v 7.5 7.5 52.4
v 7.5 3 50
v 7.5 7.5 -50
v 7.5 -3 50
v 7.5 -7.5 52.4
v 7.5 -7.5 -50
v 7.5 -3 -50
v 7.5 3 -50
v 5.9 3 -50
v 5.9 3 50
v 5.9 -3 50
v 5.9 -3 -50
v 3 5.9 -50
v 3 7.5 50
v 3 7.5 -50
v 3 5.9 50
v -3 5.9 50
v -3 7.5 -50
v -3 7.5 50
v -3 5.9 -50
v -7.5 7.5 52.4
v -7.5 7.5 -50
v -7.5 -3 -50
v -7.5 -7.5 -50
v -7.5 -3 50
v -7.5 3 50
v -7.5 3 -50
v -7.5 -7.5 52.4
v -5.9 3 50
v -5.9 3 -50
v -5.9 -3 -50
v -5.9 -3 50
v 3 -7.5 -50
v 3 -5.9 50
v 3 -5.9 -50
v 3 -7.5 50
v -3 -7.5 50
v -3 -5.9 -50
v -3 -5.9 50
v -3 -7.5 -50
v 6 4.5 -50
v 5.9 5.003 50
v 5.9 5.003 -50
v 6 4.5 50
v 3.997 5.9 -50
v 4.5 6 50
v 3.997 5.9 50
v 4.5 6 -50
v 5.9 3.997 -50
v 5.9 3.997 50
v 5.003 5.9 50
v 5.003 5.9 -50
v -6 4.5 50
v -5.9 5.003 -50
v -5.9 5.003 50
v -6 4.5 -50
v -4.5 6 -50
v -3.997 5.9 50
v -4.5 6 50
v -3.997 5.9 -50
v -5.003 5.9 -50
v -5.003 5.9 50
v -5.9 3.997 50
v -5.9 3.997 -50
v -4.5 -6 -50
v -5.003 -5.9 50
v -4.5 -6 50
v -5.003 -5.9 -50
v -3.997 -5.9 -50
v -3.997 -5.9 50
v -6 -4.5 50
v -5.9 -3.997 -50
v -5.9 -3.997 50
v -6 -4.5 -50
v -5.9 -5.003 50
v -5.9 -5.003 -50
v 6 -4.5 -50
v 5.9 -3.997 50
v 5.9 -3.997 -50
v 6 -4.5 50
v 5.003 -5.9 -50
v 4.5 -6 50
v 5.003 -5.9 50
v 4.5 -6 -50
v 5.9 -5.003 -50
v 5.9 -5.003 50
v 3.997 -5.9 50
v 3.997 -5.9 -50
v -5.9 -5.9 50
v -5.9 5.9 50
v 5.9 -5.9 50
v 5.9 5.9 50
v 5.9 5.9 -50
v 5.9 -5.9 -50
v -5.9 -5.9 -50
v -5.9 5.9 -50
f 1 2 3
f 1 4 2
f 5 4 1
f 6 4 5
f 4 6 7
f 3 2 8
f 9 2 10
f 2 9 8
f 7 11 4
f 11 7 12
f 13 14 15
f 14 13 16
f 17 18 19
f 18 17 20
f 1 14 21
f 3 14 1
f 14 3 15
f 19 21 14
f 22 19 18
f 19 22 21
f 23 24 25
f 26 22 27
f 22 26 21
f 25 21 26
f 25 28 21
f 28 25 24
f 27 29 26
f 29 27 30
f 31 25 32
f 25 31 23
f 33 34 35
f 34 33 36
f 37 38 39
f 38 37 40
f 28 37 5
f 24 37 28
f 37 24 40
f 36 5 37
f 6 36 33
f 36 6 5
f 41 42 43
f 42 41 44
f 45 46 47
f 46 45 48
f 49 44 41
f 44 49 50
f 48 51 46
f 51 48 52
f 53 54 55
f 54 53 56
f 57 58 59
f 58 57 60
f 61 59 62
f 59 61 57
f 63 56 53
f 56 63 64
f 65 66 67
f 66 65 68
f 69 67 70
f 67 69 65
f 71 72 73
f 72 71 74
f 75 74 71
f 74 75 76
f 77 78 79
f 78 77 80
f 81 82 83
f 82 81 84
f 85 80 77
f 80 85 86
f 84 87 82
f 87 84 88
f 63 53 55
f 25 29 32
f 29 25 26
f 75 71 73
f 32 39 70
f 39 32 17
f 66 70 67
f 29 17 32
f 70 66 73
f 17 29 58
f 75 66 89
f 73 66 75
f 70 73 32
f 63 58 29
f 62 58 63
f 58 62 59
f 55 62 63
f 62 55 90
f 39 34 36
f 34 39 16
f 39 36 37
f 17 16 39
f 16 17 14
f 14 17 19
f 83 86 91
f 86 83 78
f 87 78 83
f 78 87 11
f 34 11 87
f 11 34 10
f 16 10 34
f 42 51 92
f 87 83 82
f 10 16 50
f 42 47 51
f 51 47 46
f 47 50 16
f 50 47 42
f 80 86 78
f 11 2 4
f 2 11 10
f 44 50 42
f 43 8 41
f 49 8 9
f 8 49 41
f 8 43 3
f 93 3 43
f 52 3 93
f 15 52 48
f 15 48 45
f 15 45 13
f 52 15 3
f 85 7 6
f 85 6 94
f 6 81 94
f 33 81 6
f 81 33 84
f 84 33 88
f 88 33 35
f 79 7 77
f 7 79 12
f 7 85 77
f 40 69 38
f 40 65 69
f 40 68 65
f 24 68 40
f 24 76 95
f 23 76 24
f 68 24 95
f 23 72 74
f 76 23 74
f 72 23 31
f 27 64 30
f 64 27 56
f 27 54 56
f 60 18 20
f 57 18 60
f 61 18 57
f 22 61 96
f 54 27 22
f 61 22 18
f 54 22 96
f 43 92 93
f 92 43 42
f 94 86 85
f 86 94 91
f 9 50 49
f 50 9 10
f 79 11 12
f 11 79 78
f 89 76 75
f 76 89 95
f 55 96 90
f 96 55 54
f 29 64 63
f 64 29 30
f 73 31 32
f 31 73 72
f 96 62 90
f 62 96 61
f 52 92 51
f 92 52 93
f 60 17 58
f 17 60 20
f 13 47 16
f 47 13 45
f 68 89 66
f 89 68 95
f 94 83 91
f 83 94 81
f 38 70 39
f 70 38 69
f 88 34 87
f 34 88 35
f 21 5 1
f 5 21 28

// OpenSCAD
// Parameters
cross_section_width_mm = 15.0; //[7.5:30.0:0.5]
cross_section_height_mm = 15.0; //[7.5:30.0:0.5]
length_mm = 100.0; //[50.0:200.0:1]
center_model = 1; //[0:1:1]
include_corner_holes = 1; //[0:1:1]
wall_thickness_mm = 1.6; //[0.8:3.2:0.1]
slot_opening_mm = 3.2; //[1.6:6.4:0.1]
slot_depth_mm = 3.0; //[1.5:6.0:0.1]
slot_inner_width_mm = 6.0; //[3.0:10.0:0.1]
slot_inner_depth_mm = 2.5; //[1.0:5.0:0.1]
center_bore_diameter_mm = 5.0; //[2.5:10.0:0.1]
corner_hole_diameter_mm = 3.0; //[1.5:6.0:0.1]
corner_hole_inset_mm = 3.0; //[1.5:6.0:0.1]
cut_clearance_mm = 0.5; //[0.2:1.5:0.1]

// Extrusion - complete detailed geometry
module extrusion() {
  color("Silver") {
    difference() {
      // Main body
      cube([cross_section_width_mm, cross_section_height_mm, length_mm], center=true);
      
      // Inner void
      translate([0, 0, 0])
        cube([cross_section_width_mm - 2*wall_thickness_mm, cross_section_height_mm - 2*wall_thickness_mm, length_mm + 2*cut_clearance_mm], center=true);
      
      // Center bore
      translate([0, 0, 0])
        cylinder(r=center_bore_diameter_mm/2, h=length_mm + 2*cut_clearance_mm, center=true, $fn=32);
      
      // T-slot channels
      union() {
        translate([cross_section_width_mm/2 - (slot_depth_mm + slot_inner_depth_mm)/2, 0, 0])
          cube([slot_depth_mm + slot_inner_depth_mm, slot_inner_width_mm, length_mm + 2*cut_clearance_mm], center=true);
        translate([cross_section_width_mm/2 - slot_depth_mm/2, 0, 0])
          cube([slot_depth_mm, slot_opening_mm, length_mm + 2*cut_clearance_mm], center=true);
        translate([0, cross_section_height_mm/2 - (slot_depth_mm + slot_inner_depth_mm)/2, 0])
          cube([slot_inner_width_mm, slot_depth_mm + slot_inner_depth_mm, length_mm + 2*cut_clearance_mm], center=true);
        translate([0, cross_section_height_mm/2 - slot_depth_mm/2, 0])
          cube([slot_opening_mm, slot_depth_mm, length_mm + 2*cut_clearance_mm], center=true);
        translate([-cross_section_width_mm/2 + (slot_depth_mm + slot_inner_depth_mm)/2, 0, 0])
          cube([slot_depth_mm + slot_inner_depth_mm, slot_inner_width_mm, length_mm + 2*cut_clearance_mm], center=true);
        translate([-cross_section_width_mm/2 + slot_depth_mm/2, 0, 0])
          cube([slot_depth_mm, slot_opening_mm, length_mm + 2*cut_clearance_mm], center=true);
        translate([0, -cross_section_height_mm/2 + (slot_depth_mm + slot_inner_depth_mm)/2, 0])
          cube([slot_inner_width_mm, slot_depth_mm + slot_inner_depth_mm, length_mm + 2*cut_clearance_mm], center=true);
        translate([0, -cross_section_height_mm/2 + slot_depth_mm/2, 0])
          cube([slot_opening_mm, slot_depth_mm, length_mm + 2*cut_clearance_mm], center=true);
      }
      
      // Corner holes
      if (include_corner_holes) {
        union() {
          translate([cross_section_width_mm/2 - corner_hole_inset_mm, cross_section_height_mm/2 - corner_hole_inset_mm, 0])
            cylinder(r=corner_hole_diameter_mm/2, h=length_mm + 2*cut_clearance_mm, center=true, $fn=16);
          translate([-cross_section_width_mm/2 + corner_hole_inset_mm, cross_section_height_mm/2 - corner_hole_inset_mm, 0])
            cylinder(r=corner_hole_diameter_mm/2, h=length_mm + 2*cut_clearance_mm, center=true, $fn=16);
          translate([-cross_section_width_mm/2 + corner_hole_inset_mm, -cross_section_height_mm/2 + corner_hole_inset_mm, 0])
            cylinder(r=corner_hole_diameter_mm/2, h=length_mm + 2*cut_clearance_mm, center=true, $fn=16);
          translate([cross_section_width_mm/2 - corner_hole_inset_mm, -cross_section_height_mm/2 + corner_hole_inset_mm, 0])
            cylinder(r=corner_hole_diameter_mm/2, h=length_mm + 2*cut_clearance_mm, center=true, $fn=16);
        }
      }
    }
  }
}

// Extrusion Cross Section - complete detailed geometry
module extrusion_cross_section() {
  color("Silver") {
    cube([cross_section_width_mm, cross_section_height_mm, wall_thickness_mm], center=true);
  }
}

// Box Corner Profile Section - complete detailed geometry
module box_corner_profile_section() {
  color("Silver") {
    cube([cross_section_width_mm/2, cross_section_height_mm/2, wall_thickness_mm], center=true);
  }
}

// Box Corner Profile Sections - complete detailed geometry
module box_corner_profile_sections() {
  color("Silver") {
    union() {
      translate([cross_section_width_mm/4, cross_section_height_mm/4, 0])
        box_corner_profile_section();
      translate([-cross_section_width_mm/4, cross_section_height_mm/4, 0])
        box_corner_profile_section();
      translate([cross_section_width_mm/4, -cross_section_height_mm/4, 0])
        box_corner_profile_section();
      translate([-cross_section_width_mm/4, -cross_section_height_mm/4, 0])
        box_corner_profile_section();
    }
  }
}

// Assembly
module assembly() {
  extrusion();
  translate([0, 0, length_mm/2 + wall_thickness_mm/2])
    extrusion_cross_section();
  translate([0, 0, length_mm/2 + wall_thickness_mm])
    box_corner_profile_sections();
}

assembly();
